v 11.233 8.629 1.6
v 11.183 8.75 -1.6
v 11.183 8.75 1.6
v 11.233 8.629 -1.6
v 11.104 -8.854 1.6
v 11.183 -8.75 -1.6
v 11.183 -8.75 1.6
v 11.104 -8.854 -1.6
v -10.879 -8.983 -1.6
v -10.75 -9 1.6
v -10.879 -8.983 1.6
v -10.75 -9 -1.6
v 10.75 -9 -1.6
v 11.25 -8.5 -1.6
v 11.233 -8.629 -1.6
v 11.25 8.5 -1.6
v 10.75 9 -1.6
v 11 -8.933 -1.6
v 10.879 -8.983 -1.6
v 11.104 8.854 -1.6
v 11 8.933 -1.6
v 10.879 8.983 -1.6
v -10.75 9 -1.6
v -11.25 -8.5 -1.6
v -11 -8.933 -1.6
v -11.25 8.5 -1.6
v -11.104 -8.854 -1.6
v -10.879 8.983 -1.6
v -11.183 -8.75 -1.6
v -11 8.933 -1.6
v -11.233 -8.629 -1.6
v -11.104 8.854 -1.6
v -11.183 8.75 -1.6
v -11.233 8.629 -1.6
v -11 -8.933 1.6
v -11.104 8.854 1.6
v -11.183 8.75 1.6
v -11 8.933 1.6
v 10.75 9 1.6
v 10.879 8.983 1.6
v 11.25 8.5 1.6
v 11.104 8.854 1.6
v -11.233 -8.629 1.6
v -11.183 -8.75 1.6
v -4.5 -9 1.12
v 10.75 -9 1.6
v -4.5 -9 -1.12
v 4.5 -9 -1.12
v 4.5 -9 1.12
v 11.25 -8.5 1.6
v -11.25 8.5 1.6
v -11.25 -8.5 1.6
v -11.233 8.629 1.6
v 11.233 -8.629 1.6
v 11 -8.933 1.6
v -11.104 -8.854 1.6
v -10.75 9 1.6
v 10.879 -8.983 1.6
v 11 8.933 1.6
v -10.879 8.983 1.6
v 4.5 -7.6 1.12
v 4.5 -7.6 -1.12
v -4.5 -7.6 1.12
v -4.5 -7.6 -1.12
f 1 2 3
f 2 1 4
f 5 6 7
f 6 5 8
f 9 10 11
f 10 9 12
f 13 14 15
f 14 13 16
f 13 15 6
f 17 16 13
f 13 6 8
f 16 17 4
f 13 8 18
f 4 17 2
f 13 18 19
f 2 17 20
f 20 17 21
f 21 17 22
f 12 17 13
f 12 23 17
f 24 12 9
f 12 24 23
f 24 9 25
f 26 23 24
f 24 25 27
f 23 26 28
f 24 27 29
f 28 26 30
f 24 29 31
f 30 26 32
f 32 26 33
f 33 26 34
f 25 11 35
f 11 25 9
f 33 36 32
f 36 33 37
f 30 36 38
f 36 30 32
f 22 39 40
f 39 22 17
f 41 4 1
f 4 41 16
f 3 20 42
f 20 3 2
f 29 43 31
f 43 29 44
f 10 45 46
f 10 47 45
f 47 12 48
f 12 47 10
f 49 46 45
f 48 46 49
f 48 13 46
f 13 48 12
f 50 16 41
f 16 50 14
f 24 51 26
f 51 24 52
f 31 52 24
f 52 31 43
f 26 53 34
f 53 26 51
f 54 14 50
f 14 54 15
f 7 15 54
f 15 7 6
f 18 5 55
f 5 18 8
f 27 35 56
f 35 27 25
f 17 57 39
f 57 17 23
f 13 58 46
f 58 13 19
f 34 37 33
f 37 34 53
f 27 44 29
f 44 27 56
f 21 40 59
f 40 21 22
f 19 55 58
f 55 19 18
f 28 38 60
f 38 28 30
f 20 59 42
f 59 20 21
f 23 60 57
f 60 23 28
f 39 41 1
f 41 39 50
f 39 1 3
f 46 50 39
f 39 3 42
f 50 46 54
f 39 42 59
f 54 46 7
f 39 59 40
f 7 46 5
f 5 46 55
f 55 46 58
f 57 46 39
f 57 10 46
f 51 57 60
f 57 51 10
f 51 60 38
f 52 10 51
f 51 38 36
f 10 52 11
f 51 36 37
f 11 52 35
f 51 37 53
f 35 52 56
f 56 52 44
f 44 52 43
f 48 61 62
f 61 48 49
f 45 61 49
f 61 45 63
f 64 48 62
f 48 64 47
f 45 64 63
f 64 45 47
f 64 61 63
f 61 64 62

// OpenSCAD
// BuildBuddy — FR4 blank (defaults = ESP32-C3 SuperMini real mm)
// openscad -o pcb.stl -D 'w=22.5' -D 'h=18' -D 'd=3.2' assets/scad/sat_pcb.scad
// Board in XY, thickness Z; origin center.

w = 22.5;
h = 18;
d = 3.2;
fn = 24;

module rbox(ww, hh, dd, r = 0.5) {
  hull() {
    for (sx = [-1, 1], sy = [-1, 1]) {
      translate([sx * (ww / 2 - r), sy * (hh / 2 - r), 0])
        cylinder(h = dd, r = r, center = true, $fn = fn);
    }
  }
}

difference() {
  rbox(w, h, d);
  // USB-C recess on short edge (−Y)
  translate([0, -h / 2, 0])
    cube([9, 2.8, d * 0.7], center = true);
}
